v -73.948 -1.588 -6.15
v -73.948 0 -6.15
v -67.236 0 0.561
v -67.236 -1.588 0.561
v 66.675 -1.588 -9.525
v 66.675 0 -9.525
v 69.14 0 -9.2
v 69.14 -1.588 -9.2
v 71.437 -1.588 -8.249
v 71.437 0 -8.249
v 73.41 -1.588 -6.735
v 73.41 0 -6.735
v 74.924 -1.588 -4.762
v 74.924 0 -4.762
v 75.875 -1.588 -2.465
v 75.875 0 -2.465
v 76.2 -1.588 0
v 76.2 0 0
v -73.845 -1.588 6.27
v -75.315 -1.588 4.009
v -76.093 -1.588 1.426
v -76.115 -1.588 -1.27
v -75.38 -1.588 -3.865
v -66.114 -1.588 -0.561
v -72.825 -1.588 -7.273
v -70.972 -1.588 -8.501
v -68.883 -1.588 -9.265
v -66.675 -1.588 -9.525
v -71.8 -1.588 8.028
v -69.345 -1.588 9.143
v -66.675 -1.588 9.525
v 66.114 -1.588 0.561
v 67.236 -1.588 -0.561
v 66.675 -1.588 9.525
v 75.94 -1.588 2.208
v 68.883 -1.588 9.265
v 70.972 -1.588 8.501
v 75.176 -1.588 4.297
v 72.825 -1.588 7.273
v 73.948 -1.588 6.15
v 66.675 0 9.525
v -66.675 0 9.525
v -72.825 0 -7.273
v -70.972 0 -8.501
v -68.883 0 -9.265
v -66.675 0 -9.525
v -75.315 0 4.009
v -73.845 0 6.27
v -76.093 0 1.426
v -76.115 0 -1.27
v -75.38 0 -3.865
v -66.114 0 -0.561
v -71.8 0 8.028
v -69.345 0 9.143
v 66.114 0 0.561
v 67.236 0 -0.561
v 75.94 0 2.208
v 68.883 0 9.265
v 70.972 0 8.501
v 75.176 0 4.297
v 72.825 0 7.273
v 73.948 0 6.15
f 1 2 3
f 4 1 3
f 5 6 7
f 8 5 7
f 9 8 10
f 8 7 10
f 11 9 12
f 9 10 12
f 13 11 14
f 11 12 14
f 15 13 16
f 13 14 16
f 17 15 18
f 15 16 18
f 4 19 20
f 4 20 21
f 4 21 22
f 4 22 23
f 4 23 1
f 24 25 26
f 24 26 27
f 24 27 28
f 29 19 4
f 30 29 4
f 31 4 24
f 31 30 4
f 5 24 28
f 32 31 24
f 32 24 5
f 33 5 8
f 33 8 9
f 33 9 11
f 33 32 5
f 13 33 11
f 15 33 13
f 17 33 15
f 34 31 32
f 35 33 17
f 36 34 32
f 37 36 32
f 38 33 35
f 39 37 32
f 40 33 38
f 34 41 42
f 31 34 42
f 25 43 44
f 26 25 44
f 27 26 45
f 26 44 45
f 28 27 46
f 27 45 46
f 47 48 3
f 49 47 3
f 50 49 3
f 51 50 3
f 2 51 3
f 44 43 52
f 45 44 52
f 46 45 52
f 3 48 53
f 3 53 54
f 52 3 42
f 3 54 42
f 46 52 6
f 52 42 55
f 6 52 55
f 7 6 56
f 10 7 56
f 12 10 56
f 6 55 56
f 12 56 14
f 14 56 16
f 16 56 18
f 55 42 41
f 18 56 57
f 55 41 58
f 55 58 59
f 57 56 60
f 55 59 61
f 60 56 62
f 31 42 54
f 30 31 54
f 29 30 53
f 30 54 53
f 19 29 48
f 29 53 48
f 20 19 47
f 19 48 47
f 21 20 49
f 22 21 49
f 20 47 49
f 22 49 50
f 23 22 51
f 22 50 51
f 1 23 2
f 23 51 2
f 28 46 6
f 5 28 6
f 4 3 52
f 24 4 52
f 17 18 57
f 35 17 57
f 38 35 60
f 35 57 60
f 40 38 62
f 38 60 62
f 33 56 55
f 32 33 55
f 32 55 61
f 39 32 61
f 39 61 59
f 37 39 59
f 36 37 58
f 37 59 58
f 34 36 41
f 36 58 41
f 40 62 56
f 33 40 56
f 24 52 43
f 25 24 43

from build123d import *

# Parameters (mm, degrees)
F1_DEPTH = 1.5875


with BuildPart() as f1:
    # F0 (on Front) → F1 (new body)
    with BuildSketch(Plane.XZ):
        with BuildLine():
            ThreePointArc((72.825499, 7.273031), (69.949905, 8.944307), (66.675, 9.525))
            Line((66.675, 9.525), (-66.675, 9.525))
            ThreePointArc((-66.675, 9.525), (-75.315287, 4.008873), (-73.948031, -6.150499))
            Line((-73.948031, -6.150499), (-67.236266, 0.561266))
            Line((-67.236266, 0.561266), (-66.675, 0))
            Line((-66.675, 0), (-66.113734, -0.561266))
            Line((-66.113734, -0.561266), (-72.825499, -7.273031))
            ThreePointArc((-72.825499, -7.273031), (-69.949905, -8.944307), (-66.675, -9.525))
            Line((-66.675, -9.525), (66.675, -9.525))
            ThreePointArc((66.675, -9.525), (73.410192, -6.735192), (76.2, 0))
            Line((76.2, 0), (67.797532, 0))
            Line((67.797532, 0), (67.236266, -0.561266))
            Line((67.236266, -0.561266), (66.675, 0))
            Line((66.675, 0), (66.113734, 0.561266))
            Line((66.113734, 0.561266), (72.825499, 7.273031))
        make_face()
        with BuildLine():
            ThreePointArc((76.2, 0), (75.619307, 3.274905), (73.948031, 6.150499))
            Line((73.948031, 6.150499), (67.797532, 0))
            Line((67.797532, 0), (76.2, 0))
        make_face()
    extrude(amount=F1_DEPTH)


solid = f1.part
